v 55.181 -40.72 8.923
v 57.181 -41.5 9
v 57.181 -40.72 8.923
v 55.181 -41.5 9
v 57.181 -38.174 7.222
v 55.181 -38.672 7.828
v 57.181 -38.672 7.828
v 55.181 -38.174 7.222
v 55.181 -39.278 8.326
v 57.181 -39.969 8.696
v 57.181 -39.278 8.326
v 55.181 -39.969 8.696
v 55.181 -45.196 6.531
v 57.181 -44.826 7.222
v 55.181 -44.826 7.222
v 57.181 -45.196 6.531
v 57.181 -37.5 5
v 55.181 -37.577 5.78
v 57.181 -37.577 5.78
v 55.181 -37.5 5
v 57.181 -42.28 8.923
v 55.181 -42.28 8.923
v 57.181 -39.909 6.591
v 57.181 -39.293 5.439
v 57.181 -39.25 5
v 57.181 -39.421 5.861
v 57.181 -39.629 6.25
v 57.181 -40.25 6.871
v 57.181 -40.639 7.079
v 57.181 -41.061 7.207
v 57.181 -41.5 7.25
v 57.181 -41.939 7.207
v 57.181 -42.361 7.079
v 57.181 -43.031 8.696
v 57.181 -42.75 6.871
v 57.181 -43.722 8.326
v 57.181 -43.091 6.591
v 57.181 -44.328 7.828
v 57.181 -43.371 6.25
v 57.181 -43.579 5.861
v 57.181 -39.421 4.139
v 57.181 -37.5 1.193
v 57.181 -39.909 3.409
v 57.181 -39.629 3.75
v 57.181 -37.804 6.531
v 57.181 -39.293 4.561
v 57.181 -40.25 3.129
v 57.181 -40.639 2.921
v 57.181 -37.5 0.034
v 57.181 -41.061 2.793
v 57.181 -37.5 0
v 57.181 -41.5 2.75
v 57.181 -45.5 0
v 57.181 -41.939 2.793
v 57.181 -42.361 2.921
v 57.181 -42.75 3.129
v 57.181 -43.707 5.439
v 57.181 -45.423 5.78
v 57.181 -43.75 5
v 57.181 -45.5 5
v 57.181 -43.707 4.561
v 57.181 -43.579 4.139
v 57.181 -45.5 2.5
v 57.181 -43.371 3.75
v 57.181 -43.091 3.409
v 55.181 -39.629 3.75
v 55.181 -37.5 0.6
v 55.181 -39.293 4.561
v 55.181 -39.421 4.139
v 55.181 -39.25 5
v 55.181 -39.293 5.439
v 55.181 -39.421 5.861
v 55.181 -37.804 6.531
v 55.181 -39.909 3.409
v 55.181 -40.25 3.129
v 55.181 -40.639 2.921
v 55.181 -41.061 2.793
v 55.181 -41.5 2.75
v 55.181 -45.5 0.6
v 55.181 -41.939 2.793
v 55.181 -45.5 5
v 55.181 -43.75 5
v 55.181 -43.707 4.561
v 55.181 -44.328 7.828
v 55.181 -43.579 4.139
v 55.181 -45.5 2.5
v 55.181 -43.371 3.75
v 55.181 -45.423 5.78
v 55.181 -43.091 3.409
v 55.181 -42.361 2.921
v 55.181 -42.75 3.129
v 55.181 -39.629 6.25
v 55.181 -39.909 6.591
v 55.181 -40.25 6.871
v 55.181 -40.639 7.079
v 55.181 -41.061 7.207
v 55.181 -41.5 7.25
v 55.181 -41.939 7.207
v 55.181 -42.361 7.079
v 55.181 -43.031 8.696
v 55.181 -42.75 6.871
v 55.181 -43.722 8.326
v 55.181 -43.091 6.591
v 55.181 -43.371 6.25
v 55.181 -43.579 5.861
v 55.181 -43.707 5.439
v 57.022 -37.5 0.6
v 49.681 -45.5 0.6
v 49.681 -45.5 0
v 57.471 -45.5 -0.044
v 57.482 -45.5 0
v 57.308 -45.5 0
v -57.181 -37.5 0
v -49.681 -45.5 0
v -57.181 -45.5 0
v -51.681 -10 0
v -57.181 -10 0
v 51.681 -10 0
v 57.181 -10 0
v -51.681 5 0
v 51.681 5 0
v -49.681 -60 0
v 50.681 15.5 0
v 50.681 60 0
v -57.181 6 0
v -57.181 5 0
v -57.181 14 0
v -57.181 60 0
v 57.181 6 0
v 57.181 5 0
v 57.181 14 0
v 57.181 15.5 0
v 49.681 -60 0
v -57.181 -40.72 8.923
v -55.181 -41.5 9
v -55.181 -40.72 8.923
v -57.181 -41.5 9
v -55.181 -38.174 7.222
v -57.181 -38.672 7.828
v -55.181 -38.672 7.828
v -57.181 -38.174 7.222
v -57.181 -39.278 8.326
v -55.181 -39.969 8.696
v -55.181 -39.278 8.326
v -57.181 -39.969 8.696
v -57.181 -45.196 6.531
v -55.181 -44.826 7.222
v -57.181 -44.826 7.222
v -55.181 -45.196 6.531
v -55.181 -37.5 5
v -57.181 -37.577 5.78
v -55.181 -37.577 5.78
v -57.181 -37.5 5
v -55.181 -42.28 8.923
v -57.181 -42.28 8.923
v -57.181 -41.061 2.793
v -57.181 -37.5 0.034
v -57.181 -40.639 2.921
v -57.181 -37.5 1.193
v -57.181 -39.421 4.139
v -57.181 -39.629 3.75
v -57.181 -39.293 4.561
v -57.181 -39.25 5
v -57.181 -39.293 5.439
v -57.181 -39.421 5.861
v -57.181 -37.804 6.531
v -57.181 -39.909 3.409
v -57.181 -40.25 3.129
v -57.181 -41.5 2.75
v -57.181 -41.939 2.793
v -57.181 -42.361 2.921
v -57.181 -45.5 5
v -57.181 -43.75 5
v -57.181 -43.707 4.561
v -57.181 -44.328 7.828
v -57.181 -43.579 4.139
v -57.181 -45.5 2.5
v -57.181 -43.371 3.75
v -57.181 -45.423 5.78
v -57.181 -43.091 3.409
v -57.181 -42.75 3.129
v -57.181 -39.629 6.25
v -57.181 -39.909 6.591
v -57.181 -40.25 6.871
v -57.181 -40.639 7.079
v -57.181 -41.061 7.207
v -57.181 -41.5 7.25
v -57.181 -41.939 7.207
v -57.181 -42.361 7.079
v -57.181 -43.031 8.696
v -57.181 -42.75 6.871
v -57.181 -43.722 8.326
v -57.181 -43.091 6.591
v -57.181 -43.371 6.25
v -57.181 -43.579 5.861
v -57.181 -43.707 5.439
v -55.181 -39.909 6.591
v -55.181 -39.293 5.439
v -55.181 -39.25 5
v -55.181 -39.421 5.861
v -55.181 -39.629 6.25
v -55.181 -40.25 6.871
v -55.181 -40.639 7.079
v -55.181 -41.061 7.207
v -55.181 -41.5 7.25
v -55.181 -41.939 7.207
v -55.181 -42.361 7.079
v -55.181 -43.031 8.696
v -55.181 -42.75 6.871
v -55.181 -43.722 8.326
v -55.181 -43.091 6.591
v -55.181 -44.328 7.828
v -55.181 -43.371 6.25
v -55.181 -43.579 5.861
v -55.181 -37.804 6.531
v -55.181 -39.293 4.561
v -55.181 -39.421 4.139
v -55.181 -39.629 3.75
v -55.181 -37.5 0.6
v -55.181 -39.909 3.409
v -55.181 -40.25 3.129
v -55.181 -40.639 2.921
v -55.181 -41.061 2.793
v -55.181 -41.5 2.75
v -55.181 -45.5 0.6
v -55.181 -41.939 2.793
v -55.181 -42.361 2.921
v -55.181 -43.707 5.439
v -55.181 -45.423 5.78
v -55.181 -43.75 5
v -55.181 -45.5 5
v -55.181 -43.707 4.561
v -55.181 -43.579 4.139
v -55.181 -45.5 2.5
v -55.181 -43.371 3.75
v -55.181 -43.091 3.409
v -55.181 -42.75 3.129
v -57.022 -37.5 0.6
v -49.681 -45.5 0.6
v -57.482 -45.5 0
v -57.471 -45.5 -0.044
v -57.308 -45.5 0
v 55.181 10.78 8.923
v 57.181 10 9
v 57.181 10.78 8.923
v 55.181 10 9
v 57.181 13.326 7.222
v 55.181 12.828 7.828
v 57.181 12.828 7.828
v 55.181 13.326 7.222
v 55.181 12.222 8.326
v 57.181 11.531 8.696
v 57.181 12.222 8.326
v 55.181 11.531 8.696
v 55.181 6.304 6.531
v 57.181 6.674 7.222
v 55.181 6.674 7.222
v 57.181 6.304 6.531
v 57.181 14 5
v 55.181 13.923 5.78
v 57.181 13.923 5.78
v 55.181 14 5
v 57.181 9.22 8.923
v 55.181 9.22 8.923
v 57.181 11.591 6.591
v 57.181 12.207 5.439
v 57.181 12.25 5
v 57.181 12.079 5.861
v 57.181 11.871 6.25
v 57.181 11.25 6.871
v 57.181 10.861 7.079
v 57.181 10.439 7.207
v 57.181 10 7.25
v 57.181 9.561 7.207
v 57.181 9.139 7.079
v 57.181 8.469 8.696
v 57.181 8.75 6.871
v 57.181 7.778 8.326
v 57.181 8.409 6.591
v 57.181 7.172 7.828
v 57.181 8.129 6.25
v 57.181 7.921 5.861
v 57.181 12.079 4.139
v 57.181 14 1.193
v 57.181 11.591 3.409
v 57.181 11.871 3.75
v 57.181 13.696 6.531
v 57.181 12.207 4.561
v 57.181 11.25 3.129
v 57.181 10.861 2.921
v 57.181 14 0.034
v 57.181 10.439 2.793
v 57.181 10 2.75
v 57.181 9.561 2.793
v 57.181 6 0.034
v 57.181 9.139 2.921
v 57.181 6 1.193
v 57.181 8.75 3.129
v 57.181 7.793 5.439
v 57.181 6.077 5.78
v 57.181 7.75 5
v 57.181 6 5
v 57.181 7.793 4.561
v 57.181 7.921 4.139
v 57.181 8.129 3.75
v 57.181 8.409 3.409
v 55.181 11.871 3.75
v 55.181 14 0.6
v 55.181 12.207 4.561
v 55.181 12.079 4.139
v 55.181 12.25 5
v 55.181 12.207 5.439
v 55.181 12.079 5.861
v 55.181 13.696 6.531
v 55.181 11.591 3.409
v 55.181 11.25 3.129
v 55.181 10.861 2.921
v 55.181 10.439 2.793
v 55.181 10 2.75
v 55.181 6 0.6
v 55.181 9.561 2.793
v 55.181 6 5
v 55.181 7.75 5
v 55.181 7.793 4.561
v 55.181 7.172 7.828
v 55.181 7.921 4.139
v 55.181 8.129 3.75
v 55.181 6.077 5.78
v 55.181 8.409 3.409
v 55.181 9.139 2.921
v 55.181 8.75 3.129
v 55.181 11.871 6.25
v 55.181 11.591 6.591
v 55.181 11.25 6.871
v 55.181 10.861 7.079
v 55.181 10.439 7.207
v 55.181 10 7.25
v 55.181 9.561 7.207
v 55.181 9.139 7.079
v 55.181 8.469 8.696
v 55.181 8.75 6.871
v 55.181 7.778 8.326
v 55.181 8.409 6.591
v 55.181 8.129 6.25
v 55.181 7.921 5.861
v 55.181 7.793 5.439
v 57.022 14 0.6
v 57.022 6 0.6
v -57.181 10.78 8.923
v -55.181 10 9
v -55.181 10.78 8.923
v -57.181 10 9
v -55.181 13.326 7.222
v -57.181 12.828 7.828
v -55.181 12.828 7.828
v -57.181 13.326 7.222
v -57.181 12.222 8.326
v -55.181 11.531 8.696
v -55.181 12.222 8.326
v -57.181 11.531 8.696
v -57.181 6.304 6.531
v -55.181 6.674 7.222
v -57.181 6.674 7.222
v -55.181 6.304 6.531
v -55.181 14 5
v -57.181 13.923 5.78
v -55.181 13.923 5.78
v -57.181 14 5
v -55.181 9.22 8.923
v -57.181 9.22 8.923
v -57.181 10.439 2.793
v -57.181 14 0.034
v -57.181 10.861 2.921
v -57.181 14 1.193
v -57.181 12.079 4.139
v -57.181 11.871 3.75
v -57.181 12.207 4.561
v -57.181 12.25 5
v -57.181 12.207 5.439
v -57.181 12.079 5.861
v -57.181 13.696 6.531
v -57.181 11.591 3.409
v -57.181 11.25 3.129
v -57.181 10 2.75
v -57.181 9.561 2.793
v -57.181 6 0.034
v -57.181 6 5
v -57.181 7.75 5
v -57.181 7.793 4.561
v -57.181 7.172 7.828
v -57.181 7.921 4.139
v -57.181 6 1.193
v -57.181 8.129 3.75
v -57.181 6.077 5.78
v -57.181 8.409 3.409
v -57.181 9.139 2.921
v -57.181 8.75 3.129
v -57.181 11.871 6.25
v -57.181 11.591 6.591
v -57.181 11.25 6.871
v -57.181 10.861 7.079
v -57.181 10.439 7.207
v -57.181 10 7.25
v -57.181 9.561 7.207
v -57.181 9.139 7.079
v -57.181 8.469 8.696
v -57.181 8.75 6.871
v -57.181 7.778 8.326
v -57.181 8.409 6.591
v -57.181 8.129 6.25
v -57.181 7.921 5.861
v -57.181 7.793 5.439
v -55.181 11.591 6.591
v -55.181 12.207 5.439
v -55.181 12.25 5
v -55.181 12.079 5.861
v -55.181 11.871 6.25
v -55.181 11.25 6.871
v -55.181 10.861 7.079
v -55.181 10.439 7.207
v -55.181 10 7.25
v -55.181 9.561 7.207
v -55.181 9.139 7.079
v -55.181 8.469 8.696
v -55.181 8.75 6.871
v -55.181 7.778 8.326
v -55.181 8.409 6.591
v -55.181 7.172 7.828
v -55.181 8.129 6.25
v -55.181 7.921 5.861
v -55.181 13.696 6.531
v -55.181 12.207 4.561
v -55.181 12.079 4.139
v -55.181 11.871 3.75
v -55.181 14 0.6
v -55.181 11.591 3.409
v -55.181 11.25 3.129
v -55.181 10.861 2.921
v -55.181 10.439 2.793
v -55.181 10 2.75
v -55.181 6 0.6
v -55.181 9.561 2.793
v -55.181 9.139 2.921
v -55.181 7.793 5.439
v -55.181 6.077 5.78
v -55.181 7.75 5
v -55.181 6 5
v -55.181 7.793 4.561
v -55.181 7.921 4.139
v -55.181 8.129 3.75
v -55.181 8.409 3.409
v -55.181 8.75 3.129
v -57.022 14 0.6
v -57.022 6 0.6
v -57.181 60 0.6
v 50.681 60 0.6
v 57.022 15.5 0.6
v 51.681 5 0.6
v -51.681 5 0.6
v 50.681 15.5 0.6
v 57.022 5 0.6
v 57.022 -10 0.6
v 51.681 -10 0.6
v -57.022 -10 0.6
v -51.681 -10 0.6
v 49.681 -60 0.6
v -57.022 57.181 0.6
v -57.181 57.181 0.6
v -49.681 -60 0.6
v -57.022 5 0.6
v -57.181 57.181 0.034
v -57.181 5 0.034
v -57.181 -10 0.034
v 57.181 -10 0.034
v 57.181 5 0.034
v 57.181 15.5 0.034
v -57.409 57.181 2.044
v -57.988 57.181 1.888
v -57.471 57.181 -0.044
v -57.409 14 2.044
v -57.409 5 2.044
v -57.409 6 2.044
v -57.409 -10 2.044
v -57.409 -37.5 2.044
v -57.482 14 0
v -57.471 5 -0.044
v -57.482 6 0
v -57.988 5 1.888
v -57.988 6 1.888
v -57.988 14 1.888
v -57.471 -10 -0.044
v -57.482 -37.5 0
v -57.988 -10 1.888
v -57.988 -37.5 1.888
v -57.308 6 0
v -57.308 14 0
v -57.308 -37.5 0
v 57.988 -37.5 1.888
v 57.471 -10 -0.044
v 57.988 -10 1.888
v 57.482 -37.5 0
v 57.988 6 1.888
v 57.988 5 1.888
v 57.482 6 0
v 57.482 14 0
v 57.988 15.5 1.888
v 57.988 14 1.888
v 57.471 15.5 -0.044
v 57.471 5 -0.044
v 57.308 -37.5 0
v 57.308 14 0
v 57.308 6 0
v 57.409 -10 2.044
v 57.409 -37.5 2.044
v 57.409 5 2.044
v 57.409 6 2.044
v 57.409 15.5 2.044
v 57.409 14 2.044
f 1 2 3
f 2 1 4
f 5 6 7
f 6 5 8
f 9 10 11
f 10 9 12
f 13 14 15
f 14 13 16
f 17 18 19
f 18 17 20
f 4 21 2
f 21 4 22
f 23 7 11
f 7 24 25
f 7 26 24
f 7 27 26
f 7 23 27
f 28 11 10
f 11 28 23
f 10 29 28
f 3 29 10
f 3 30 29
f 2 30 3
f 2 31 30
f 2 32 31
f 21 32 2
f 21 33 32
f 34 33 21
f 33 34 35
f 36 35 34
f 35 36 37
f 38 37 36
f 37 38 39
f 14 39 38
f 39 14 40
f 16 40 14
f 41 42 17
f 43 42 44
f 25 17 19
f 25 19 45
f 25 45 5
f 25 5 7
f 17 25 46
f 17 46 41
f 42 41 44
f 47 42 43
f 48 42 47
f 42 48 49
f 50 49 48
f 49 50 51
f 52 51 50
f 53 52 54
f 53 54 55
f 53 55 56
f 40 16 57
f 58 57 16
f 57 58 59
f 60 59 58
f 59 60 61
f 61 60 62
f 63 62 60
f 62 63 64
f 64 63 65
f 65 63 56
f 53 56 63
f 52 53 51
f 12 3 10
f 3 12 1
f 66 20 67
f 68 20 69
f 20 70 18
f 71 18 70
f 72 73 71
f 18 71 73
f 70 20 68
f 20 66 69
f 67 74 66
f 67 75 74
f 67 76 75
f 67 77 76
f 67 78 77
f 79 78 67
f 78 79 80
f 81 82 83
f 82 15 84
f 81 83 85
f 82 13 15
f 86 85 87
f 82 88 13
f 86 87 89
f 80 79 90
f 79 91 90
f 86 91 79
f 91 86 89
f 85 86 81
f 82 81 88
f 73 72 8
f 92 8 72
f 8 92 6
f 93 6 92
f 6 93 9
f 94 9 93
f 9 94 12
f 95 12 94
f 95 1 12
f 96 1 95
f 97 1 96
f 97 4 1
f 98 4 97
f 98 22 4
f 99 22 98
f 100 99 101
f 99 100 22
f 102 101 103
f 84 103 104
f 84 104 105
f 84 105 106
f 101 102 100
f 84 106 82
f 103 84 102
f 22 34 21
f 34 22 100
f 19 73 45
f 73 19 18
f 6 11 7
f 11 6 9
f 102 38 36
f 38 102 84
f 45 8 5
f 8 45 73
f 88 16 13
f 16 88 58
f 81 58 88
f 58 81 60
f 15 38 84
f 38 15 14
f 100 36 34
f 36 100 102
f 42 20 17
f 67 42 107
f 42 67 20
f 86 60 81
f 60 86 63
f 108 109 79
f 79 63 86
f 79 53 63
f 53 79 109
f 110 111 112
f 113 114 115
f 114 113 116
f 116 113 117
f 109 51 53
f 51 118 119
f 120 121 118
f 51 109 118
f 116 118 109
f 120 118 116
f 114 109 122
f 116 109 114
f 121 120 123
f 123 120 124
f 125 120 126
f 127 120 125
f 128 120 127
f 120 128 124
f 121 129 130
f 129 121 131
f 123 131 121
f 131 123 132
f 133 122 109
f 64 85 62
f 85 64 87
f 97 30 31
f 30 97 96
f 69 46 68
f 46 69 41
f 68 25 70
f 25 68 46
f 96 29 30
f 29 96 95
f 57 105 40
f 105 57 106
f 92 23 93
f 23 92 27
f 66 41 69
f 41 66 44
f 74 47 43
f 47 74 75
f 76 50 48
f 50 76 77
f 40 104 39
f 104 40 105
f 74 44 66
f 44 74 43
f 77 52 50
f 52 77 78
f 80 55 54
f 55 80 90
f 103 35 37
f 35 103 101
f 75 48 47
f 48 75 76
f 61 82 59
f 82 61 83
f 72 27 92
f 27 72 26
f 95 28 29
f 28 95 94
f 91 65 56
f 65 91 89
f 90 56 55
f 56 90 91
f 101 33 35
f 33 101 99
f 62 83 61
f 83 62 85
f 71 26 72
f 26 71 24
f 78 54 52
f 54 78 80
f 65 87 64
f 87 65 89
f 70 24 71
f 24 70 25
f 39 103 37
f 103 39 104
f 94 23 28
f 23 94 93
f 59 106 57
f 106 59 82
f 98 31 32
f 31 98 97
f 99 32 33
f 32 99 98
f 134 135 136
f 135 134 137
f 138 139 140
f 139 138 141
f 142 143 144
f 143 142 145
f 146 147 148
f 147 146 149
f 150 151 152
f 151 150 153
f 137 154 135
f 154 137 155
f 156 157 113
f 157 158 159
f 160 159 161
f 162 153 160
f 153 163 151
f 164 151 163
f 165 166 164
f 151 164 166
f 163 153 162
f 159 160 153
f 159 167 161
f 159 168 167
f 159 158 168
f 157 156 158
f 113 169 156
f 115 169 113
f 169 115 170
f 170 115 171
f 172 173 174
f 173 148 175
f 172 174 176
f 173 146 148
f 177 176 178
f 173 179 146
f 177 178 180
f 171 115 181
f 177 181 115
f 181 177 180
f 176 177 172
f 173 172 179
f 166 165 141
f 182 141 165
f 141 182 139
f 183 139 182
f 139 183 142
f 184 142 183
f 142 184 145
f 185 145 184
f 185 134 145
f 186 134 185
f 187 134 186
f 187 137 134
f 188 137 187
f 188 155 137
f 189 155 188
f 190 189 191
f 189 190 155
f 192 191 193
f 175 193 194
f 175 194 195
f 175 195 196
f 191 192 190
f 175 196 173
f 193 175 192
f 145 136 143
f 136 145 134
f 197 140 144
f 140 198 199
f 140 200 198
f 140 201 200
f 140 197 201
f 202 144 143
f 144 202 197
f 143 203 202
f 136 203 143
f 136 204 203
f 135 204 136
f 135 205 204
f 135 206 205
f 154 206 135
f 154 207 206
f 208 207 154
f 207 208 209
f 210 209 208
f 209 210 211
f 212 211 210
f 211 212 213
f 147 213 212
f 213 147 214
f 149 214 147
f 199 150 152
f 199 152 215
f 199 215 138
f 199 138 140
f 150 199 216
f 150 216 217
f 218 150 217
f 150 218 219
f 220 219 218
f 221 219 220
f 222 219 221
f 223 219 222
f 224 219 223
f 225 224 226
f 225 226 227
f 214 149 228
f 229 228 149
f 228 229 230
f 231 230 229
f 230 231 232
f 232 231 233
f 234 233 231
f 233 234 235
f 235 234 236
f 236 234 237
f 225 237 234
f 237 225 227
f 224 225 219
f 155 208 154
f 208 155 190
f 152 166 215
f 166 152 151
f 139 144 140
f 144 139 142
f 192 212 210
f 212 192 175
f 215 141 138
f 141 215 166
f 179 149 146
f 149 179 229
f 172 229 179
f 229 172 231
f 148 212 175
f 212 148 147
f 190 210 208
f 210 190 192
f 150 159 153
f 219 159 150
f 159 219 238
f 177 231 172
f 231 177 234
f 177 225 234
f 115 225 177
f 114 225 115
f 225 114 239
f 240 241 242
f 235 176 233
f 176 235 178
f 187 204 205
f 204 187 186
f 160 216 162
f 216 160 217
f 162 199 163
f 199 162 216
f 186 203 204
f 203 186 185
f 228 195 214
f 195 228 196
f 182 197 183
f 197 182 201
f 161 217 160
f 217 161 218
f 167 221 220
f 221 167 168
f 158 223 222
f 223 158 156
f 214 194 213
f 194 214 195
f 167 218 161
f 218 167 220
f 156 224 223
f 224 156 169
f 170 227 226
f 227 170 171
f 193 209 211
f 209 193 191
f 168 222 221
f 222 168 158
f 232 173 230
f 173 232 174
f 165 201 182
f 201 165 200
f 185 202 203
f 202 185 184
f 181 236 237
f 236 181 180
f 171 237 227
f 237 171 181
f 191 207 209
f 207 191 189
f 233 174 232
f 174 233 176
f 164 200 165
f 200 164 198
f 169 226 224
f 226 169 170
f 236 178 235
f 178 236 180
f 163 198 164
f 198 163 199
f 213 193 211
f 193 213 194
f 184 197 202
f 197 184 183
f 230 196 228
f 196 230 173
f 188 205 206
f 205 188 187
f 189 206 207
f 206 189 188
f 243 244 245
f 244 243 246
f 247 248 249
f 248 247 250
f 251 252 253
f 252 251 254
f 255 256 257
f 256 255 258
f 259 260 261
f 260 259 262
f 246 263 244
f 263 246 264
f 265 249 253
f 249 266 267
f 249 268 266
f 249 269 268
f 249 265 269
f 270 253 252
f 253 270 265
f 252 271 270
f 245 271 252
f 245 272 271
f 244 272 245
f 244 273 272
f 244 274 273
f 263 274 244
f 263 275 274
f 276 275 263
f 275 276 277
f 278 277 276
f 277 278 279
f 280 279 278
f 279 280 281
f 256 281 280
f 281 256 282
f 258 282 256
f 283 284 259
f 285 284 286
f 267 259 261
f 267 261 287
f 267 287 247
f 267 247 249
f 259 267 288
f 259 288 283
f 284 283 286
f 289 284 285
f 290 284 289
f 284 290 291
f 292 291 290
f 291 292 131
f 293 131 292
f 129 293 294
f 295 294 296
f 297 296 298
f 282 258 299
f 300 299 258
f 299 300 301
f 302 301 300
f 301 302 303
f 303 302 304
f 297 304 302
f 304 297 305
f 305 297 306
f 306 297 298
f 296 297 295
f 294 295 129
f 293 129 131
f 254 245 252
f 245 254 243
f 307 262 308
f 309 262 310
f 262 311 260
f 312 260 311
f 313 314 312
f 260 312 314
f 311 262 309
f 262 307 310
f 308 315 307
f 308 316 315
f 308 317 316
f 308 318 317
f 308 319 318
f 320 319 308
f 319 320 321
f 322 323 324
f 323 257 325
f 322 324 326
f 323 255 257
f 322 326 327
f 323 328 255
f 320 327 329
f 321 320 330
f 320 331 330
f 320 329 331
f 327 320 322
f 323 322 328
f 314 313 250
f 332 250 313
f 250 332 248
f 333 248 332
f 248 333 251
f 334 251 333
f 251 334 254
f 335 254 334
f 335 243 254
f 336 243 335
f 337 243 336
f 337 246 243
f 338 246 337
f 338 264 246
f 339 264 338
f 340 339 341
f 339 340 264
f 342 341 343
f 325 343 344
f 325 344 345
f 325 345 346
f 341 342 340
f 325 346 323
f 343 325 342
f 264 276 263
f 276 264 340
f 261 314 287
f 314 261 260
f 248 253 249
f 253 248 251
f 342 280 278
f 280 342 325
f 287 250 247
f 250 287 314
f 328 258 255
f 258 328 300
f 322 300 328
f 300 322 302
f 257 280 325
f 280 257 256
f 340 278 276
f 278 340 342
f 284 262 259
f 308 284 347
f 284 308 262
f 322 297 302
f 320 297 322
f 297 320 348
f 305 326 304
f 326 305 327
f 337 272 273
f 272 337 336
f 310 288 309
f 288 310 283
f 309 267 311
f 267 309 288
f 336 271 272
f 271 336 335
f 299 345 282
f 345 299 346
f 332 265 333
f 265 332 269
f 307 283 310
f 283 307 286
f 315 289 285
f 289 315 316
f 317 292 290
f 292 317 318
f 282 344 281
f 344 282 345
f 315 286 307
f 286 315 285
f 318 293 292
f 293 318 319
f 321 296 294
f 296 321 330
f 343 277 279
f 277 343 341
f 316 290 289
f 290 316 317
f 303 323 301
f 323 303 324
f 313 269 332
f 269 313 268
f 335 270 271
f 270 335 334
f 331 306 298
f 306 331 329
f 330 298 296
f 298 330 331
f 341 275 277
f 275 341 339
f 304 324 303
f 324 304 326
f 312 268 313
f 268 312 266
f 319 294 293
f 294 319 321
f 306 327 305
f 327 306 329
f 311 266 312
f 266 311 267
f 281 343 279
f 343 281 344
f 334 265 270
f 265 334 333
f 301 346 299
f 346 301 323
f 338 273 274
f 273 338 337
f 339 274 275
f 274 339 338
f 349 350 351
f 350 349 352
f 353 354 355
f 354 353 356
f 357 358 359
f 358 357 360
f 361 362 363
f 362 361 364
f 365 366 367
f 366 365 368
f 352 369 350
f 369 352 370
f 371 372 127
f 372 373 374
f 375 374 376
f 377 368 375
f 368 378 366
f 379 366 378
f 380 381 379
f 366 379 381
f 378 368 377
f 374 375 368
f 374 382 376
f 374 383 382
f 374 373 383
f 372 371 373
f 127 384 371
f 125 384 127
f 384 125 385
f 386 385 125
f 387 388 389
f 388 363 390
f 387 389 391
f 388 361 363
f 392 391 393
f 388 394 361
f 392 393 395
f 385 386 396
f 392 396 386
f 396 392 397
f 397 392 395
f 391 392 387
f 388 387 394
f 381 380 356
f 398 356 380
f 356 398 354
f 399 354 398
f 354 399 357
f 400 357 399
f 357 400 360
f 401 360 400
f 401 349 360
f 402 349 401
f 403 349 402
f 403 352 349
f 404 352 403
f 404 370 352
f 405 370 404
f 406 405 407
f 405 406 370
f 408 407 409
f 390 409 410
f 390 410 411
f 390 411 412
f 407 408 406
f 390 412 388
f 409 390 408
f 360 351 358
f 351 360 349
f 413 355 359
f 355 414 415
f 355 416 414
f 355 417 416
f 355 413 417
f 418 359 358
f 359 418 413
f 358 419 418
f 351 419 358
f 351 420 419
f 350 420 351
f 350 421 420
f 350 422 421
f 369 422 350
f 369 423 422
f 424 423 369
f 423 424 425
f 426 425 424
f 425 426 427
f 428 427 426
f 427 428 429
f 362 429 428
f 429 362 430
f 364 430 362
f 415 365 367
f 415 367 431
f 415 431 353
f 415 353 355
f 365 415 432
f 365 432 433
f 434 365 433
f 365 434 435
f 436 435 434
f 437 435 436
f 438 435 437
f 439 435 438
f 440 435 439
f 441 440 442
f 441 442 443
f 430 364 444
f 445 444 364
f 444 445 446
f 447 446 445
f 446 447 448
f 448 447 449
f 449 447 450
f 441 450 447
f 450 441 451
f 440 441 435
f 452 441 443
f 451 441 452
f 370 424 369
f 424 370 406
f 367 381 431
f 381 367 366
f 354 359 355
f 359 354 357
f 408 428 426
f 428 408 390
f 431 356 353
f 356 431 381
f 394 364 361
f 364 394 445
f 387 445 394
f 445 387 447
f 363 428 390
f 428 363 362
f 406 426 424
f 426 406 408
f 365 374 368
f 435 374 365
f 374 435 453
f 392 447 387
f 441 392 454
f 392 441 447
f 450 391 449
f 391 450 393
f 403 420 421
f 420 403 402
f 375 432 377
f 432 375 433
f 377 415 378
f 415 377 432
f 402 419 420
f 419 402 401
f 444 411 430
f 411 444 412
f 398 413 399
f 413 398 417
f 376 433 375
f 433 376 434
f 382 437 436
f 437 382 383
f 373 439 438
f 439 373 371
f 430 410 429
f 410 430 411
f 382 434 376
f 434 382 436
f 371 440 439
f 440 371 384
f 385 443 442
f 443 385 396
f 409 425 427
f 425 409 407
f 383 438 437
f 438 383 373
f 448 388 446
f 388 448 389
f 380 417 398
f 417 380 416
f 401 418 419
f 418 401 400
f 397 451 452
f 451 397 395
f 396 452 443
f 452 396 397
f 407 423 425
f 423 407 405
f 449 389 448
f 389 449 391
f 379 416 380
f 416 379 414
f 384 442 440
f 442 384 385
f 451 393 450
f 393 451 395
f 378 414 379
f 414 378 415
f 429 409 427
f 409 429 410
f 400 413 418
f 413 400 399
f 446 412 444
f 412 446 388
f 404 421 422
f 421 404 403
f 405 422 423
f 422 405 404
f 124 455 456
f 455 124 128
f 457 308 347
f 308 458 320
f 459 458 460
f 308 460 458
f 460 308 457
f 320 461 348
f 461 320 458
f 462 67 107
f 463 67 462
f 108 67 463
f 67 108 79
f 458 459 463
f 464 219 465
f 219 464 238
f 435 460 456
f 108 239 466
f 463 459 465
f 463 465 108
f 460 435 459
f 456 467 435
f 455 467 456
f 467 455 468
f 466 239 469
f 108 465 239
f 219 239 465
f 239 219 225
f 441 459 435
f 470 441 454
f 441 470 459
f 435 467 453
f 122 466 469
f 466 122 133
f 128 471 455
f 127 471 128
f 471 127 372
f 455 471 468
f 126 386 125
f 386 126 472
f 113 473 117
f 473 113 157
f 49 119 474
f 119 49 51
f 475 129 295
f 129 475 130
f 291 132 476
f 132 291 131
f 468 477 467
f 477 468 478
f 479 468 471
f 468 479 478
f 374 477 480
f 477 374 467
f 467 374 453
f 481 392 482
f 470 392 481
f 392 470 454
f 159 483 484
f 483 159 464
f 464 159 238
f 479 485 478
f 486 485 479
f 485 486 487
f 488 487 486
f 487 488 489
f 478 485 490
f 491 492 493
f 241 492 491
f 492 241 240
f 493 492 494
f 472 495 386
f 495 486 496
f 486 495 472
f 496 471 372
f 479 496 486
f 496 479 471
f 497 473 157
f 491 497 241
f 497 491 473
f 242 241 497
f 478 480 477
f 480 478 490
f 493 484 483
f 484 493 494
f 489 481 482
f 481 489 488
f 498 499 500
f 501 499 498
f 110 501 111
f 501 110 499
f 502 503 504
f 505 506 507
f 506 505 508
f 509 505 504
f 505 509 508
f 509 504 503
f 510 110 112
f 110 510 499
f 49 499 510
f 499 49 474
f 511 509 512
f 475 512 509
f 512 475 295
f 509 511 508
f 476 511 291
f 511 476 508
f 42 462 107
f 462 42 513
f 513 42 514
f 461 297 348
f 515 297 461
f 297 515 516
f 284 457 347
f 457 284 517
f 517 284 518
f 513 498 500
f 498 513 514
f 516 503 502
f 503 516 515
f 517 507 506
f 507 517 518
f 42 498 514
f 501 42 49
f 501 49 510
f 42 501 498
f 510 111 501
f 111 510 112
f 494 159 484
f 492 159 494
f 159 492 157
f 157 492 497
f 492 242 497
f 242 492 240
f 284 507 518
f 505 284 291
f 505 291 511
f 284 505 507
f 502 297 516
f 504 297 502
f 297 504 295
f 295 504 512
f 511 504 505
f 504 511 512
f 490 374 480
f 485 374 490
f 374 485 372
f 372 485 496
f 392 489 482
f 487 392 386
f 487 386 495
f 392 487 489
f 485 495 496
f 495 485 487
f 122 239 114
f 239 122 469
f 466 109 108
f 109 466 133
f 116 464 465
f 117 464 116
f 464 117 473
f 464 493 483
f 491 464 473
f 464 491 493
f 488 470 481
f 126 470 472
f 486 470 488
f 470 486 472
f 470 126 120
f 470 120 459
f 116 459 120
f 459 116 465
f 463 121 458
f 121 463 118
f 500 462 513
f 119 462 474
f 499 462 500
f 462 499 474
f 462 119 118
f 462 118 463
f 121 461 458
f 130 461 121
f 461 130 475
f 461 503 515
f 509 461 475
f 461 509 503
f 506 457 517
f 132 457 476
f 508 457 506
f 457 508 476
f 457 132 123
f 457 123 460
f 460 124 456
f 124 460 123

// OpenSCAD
/*
    Proxymow Mower - Drive Train Cover
    Print in PETG

    Print flat then fold over brackets and screw to base
    Left-hand and right-hand required
*/
internal_dia = 49.25;//mm
internal_height = 43.125;//mm
cover_length = 120;//mm
foot_width = 8;//mm
foot_extent = 5;//mm
foot_thickness = 2;//mm
seal_width = 2;//mm
seal_angle = 75;
notch_width = 15;//mm
notch_height = 7;//mm
fix_hole_dia = 4.5;
wall_thickness = 0.6;
wall_distance = internal_height - (internal_dia/2);
half_circum = PI * internal_dia / 2;
cover_distance = (wall_distance * 2) + half_circum;
echo("cover_distance", cover_distance);

module tab() {
    rotate([270, 0, 0]) translate([0, -foot_extent, -(cover_distance-foot_thickness)/2]) difference() {
        union() {
            cylinder(h=foot_thickness, d=foot_width, $fn=32, center=true);
            translate([0, foot_extent/2, 0]) cube([foot_width, foot_extent, foot_thickness], $fn=32, center=true);
        }
        cylinder(h=foot_thickness+1, d=fix_hole_dia, $fn=32, center=true);
    }
}

module seal() {
    translate([0, (cover_distance + (cos(seal_angle) * seal_width))/2, seal_width/2]) rotate([seal_angle, 0, 0]) cube([cover_distance, seal_width, wall_thickness], center=true);
}
module notch1() {
    translate([-cover_length/2 - 0.5, (cover_distance + foot_thickness)/2+0.5, -foot_extent/2]) rotate([90, 0, 0]) cube([notch_width, foot_extent, notch_height+2], center=false);
}
module notch2() {
    translate([-cover_length/2 + 50, (cover_distance + foot_thickness)/2+0.5, -foot_extent/2]) rotate([90, 0, 0]) cube([notch_width, foot_extent, notch_height], center=false);
}
module notch3() {
    translate([(cover_length/2) - (3*notch_width/2) + 0.5, -(cover_distance/2)+foot_thickness, foot_extent/2]) rotate([90, 0, 0]) cube([notch_width*3, foot_extent*2, notch_height+2], center=true);
}
module notch4() {
    translate([(cover_length/2) - (3*notch_width/2) + 0.5, (cover_distance/2)-foot_thickness, foot_extent/2]) rotate([90, 0, 0]) cube([notch_width*3, foot_extent*2, notch_height+2], center=true);
}
module cover(left_handed=true) {
    difference() {
        union() {
            translate([0, 0, wall_thickness/2]) cube([cover_length, cover_distance, wall_thickness], center=true);
            translate([-41.5, 0, 0]) tab();
            translate([-41.5, 0, 0]) mirror([0, 1, 0]) tab();
            translate([10, 0, 0]) tab();
            translate([10, 0, 0]) mirror([0, 1, 0]) tab();
            seal();
            mirror([0, 1, 0]) seal();
        }
        translate([-41.5, -foot_thickness, 0]) tab();
        mirror([0, 1, 0]) translate([-41.5, -foot_thickness, 0]) tab();
        translate([10, -foot_thickness, 0]) tab();
        mirror([0, 1, 0]) translate([10, -foot_thickness, 0]) tab();
        notch1();
        mirror([0, 1, 0]) notch1();
        notch2();
        mirror([0, 1, 0]) notch2();
        if (left_handed) notch3(); else notch4();
    }
}
//Left handed
rotate([0, 0, 90]) cover(true);

//Right handed
//rotate([0, 0, 90]) cover(false);
